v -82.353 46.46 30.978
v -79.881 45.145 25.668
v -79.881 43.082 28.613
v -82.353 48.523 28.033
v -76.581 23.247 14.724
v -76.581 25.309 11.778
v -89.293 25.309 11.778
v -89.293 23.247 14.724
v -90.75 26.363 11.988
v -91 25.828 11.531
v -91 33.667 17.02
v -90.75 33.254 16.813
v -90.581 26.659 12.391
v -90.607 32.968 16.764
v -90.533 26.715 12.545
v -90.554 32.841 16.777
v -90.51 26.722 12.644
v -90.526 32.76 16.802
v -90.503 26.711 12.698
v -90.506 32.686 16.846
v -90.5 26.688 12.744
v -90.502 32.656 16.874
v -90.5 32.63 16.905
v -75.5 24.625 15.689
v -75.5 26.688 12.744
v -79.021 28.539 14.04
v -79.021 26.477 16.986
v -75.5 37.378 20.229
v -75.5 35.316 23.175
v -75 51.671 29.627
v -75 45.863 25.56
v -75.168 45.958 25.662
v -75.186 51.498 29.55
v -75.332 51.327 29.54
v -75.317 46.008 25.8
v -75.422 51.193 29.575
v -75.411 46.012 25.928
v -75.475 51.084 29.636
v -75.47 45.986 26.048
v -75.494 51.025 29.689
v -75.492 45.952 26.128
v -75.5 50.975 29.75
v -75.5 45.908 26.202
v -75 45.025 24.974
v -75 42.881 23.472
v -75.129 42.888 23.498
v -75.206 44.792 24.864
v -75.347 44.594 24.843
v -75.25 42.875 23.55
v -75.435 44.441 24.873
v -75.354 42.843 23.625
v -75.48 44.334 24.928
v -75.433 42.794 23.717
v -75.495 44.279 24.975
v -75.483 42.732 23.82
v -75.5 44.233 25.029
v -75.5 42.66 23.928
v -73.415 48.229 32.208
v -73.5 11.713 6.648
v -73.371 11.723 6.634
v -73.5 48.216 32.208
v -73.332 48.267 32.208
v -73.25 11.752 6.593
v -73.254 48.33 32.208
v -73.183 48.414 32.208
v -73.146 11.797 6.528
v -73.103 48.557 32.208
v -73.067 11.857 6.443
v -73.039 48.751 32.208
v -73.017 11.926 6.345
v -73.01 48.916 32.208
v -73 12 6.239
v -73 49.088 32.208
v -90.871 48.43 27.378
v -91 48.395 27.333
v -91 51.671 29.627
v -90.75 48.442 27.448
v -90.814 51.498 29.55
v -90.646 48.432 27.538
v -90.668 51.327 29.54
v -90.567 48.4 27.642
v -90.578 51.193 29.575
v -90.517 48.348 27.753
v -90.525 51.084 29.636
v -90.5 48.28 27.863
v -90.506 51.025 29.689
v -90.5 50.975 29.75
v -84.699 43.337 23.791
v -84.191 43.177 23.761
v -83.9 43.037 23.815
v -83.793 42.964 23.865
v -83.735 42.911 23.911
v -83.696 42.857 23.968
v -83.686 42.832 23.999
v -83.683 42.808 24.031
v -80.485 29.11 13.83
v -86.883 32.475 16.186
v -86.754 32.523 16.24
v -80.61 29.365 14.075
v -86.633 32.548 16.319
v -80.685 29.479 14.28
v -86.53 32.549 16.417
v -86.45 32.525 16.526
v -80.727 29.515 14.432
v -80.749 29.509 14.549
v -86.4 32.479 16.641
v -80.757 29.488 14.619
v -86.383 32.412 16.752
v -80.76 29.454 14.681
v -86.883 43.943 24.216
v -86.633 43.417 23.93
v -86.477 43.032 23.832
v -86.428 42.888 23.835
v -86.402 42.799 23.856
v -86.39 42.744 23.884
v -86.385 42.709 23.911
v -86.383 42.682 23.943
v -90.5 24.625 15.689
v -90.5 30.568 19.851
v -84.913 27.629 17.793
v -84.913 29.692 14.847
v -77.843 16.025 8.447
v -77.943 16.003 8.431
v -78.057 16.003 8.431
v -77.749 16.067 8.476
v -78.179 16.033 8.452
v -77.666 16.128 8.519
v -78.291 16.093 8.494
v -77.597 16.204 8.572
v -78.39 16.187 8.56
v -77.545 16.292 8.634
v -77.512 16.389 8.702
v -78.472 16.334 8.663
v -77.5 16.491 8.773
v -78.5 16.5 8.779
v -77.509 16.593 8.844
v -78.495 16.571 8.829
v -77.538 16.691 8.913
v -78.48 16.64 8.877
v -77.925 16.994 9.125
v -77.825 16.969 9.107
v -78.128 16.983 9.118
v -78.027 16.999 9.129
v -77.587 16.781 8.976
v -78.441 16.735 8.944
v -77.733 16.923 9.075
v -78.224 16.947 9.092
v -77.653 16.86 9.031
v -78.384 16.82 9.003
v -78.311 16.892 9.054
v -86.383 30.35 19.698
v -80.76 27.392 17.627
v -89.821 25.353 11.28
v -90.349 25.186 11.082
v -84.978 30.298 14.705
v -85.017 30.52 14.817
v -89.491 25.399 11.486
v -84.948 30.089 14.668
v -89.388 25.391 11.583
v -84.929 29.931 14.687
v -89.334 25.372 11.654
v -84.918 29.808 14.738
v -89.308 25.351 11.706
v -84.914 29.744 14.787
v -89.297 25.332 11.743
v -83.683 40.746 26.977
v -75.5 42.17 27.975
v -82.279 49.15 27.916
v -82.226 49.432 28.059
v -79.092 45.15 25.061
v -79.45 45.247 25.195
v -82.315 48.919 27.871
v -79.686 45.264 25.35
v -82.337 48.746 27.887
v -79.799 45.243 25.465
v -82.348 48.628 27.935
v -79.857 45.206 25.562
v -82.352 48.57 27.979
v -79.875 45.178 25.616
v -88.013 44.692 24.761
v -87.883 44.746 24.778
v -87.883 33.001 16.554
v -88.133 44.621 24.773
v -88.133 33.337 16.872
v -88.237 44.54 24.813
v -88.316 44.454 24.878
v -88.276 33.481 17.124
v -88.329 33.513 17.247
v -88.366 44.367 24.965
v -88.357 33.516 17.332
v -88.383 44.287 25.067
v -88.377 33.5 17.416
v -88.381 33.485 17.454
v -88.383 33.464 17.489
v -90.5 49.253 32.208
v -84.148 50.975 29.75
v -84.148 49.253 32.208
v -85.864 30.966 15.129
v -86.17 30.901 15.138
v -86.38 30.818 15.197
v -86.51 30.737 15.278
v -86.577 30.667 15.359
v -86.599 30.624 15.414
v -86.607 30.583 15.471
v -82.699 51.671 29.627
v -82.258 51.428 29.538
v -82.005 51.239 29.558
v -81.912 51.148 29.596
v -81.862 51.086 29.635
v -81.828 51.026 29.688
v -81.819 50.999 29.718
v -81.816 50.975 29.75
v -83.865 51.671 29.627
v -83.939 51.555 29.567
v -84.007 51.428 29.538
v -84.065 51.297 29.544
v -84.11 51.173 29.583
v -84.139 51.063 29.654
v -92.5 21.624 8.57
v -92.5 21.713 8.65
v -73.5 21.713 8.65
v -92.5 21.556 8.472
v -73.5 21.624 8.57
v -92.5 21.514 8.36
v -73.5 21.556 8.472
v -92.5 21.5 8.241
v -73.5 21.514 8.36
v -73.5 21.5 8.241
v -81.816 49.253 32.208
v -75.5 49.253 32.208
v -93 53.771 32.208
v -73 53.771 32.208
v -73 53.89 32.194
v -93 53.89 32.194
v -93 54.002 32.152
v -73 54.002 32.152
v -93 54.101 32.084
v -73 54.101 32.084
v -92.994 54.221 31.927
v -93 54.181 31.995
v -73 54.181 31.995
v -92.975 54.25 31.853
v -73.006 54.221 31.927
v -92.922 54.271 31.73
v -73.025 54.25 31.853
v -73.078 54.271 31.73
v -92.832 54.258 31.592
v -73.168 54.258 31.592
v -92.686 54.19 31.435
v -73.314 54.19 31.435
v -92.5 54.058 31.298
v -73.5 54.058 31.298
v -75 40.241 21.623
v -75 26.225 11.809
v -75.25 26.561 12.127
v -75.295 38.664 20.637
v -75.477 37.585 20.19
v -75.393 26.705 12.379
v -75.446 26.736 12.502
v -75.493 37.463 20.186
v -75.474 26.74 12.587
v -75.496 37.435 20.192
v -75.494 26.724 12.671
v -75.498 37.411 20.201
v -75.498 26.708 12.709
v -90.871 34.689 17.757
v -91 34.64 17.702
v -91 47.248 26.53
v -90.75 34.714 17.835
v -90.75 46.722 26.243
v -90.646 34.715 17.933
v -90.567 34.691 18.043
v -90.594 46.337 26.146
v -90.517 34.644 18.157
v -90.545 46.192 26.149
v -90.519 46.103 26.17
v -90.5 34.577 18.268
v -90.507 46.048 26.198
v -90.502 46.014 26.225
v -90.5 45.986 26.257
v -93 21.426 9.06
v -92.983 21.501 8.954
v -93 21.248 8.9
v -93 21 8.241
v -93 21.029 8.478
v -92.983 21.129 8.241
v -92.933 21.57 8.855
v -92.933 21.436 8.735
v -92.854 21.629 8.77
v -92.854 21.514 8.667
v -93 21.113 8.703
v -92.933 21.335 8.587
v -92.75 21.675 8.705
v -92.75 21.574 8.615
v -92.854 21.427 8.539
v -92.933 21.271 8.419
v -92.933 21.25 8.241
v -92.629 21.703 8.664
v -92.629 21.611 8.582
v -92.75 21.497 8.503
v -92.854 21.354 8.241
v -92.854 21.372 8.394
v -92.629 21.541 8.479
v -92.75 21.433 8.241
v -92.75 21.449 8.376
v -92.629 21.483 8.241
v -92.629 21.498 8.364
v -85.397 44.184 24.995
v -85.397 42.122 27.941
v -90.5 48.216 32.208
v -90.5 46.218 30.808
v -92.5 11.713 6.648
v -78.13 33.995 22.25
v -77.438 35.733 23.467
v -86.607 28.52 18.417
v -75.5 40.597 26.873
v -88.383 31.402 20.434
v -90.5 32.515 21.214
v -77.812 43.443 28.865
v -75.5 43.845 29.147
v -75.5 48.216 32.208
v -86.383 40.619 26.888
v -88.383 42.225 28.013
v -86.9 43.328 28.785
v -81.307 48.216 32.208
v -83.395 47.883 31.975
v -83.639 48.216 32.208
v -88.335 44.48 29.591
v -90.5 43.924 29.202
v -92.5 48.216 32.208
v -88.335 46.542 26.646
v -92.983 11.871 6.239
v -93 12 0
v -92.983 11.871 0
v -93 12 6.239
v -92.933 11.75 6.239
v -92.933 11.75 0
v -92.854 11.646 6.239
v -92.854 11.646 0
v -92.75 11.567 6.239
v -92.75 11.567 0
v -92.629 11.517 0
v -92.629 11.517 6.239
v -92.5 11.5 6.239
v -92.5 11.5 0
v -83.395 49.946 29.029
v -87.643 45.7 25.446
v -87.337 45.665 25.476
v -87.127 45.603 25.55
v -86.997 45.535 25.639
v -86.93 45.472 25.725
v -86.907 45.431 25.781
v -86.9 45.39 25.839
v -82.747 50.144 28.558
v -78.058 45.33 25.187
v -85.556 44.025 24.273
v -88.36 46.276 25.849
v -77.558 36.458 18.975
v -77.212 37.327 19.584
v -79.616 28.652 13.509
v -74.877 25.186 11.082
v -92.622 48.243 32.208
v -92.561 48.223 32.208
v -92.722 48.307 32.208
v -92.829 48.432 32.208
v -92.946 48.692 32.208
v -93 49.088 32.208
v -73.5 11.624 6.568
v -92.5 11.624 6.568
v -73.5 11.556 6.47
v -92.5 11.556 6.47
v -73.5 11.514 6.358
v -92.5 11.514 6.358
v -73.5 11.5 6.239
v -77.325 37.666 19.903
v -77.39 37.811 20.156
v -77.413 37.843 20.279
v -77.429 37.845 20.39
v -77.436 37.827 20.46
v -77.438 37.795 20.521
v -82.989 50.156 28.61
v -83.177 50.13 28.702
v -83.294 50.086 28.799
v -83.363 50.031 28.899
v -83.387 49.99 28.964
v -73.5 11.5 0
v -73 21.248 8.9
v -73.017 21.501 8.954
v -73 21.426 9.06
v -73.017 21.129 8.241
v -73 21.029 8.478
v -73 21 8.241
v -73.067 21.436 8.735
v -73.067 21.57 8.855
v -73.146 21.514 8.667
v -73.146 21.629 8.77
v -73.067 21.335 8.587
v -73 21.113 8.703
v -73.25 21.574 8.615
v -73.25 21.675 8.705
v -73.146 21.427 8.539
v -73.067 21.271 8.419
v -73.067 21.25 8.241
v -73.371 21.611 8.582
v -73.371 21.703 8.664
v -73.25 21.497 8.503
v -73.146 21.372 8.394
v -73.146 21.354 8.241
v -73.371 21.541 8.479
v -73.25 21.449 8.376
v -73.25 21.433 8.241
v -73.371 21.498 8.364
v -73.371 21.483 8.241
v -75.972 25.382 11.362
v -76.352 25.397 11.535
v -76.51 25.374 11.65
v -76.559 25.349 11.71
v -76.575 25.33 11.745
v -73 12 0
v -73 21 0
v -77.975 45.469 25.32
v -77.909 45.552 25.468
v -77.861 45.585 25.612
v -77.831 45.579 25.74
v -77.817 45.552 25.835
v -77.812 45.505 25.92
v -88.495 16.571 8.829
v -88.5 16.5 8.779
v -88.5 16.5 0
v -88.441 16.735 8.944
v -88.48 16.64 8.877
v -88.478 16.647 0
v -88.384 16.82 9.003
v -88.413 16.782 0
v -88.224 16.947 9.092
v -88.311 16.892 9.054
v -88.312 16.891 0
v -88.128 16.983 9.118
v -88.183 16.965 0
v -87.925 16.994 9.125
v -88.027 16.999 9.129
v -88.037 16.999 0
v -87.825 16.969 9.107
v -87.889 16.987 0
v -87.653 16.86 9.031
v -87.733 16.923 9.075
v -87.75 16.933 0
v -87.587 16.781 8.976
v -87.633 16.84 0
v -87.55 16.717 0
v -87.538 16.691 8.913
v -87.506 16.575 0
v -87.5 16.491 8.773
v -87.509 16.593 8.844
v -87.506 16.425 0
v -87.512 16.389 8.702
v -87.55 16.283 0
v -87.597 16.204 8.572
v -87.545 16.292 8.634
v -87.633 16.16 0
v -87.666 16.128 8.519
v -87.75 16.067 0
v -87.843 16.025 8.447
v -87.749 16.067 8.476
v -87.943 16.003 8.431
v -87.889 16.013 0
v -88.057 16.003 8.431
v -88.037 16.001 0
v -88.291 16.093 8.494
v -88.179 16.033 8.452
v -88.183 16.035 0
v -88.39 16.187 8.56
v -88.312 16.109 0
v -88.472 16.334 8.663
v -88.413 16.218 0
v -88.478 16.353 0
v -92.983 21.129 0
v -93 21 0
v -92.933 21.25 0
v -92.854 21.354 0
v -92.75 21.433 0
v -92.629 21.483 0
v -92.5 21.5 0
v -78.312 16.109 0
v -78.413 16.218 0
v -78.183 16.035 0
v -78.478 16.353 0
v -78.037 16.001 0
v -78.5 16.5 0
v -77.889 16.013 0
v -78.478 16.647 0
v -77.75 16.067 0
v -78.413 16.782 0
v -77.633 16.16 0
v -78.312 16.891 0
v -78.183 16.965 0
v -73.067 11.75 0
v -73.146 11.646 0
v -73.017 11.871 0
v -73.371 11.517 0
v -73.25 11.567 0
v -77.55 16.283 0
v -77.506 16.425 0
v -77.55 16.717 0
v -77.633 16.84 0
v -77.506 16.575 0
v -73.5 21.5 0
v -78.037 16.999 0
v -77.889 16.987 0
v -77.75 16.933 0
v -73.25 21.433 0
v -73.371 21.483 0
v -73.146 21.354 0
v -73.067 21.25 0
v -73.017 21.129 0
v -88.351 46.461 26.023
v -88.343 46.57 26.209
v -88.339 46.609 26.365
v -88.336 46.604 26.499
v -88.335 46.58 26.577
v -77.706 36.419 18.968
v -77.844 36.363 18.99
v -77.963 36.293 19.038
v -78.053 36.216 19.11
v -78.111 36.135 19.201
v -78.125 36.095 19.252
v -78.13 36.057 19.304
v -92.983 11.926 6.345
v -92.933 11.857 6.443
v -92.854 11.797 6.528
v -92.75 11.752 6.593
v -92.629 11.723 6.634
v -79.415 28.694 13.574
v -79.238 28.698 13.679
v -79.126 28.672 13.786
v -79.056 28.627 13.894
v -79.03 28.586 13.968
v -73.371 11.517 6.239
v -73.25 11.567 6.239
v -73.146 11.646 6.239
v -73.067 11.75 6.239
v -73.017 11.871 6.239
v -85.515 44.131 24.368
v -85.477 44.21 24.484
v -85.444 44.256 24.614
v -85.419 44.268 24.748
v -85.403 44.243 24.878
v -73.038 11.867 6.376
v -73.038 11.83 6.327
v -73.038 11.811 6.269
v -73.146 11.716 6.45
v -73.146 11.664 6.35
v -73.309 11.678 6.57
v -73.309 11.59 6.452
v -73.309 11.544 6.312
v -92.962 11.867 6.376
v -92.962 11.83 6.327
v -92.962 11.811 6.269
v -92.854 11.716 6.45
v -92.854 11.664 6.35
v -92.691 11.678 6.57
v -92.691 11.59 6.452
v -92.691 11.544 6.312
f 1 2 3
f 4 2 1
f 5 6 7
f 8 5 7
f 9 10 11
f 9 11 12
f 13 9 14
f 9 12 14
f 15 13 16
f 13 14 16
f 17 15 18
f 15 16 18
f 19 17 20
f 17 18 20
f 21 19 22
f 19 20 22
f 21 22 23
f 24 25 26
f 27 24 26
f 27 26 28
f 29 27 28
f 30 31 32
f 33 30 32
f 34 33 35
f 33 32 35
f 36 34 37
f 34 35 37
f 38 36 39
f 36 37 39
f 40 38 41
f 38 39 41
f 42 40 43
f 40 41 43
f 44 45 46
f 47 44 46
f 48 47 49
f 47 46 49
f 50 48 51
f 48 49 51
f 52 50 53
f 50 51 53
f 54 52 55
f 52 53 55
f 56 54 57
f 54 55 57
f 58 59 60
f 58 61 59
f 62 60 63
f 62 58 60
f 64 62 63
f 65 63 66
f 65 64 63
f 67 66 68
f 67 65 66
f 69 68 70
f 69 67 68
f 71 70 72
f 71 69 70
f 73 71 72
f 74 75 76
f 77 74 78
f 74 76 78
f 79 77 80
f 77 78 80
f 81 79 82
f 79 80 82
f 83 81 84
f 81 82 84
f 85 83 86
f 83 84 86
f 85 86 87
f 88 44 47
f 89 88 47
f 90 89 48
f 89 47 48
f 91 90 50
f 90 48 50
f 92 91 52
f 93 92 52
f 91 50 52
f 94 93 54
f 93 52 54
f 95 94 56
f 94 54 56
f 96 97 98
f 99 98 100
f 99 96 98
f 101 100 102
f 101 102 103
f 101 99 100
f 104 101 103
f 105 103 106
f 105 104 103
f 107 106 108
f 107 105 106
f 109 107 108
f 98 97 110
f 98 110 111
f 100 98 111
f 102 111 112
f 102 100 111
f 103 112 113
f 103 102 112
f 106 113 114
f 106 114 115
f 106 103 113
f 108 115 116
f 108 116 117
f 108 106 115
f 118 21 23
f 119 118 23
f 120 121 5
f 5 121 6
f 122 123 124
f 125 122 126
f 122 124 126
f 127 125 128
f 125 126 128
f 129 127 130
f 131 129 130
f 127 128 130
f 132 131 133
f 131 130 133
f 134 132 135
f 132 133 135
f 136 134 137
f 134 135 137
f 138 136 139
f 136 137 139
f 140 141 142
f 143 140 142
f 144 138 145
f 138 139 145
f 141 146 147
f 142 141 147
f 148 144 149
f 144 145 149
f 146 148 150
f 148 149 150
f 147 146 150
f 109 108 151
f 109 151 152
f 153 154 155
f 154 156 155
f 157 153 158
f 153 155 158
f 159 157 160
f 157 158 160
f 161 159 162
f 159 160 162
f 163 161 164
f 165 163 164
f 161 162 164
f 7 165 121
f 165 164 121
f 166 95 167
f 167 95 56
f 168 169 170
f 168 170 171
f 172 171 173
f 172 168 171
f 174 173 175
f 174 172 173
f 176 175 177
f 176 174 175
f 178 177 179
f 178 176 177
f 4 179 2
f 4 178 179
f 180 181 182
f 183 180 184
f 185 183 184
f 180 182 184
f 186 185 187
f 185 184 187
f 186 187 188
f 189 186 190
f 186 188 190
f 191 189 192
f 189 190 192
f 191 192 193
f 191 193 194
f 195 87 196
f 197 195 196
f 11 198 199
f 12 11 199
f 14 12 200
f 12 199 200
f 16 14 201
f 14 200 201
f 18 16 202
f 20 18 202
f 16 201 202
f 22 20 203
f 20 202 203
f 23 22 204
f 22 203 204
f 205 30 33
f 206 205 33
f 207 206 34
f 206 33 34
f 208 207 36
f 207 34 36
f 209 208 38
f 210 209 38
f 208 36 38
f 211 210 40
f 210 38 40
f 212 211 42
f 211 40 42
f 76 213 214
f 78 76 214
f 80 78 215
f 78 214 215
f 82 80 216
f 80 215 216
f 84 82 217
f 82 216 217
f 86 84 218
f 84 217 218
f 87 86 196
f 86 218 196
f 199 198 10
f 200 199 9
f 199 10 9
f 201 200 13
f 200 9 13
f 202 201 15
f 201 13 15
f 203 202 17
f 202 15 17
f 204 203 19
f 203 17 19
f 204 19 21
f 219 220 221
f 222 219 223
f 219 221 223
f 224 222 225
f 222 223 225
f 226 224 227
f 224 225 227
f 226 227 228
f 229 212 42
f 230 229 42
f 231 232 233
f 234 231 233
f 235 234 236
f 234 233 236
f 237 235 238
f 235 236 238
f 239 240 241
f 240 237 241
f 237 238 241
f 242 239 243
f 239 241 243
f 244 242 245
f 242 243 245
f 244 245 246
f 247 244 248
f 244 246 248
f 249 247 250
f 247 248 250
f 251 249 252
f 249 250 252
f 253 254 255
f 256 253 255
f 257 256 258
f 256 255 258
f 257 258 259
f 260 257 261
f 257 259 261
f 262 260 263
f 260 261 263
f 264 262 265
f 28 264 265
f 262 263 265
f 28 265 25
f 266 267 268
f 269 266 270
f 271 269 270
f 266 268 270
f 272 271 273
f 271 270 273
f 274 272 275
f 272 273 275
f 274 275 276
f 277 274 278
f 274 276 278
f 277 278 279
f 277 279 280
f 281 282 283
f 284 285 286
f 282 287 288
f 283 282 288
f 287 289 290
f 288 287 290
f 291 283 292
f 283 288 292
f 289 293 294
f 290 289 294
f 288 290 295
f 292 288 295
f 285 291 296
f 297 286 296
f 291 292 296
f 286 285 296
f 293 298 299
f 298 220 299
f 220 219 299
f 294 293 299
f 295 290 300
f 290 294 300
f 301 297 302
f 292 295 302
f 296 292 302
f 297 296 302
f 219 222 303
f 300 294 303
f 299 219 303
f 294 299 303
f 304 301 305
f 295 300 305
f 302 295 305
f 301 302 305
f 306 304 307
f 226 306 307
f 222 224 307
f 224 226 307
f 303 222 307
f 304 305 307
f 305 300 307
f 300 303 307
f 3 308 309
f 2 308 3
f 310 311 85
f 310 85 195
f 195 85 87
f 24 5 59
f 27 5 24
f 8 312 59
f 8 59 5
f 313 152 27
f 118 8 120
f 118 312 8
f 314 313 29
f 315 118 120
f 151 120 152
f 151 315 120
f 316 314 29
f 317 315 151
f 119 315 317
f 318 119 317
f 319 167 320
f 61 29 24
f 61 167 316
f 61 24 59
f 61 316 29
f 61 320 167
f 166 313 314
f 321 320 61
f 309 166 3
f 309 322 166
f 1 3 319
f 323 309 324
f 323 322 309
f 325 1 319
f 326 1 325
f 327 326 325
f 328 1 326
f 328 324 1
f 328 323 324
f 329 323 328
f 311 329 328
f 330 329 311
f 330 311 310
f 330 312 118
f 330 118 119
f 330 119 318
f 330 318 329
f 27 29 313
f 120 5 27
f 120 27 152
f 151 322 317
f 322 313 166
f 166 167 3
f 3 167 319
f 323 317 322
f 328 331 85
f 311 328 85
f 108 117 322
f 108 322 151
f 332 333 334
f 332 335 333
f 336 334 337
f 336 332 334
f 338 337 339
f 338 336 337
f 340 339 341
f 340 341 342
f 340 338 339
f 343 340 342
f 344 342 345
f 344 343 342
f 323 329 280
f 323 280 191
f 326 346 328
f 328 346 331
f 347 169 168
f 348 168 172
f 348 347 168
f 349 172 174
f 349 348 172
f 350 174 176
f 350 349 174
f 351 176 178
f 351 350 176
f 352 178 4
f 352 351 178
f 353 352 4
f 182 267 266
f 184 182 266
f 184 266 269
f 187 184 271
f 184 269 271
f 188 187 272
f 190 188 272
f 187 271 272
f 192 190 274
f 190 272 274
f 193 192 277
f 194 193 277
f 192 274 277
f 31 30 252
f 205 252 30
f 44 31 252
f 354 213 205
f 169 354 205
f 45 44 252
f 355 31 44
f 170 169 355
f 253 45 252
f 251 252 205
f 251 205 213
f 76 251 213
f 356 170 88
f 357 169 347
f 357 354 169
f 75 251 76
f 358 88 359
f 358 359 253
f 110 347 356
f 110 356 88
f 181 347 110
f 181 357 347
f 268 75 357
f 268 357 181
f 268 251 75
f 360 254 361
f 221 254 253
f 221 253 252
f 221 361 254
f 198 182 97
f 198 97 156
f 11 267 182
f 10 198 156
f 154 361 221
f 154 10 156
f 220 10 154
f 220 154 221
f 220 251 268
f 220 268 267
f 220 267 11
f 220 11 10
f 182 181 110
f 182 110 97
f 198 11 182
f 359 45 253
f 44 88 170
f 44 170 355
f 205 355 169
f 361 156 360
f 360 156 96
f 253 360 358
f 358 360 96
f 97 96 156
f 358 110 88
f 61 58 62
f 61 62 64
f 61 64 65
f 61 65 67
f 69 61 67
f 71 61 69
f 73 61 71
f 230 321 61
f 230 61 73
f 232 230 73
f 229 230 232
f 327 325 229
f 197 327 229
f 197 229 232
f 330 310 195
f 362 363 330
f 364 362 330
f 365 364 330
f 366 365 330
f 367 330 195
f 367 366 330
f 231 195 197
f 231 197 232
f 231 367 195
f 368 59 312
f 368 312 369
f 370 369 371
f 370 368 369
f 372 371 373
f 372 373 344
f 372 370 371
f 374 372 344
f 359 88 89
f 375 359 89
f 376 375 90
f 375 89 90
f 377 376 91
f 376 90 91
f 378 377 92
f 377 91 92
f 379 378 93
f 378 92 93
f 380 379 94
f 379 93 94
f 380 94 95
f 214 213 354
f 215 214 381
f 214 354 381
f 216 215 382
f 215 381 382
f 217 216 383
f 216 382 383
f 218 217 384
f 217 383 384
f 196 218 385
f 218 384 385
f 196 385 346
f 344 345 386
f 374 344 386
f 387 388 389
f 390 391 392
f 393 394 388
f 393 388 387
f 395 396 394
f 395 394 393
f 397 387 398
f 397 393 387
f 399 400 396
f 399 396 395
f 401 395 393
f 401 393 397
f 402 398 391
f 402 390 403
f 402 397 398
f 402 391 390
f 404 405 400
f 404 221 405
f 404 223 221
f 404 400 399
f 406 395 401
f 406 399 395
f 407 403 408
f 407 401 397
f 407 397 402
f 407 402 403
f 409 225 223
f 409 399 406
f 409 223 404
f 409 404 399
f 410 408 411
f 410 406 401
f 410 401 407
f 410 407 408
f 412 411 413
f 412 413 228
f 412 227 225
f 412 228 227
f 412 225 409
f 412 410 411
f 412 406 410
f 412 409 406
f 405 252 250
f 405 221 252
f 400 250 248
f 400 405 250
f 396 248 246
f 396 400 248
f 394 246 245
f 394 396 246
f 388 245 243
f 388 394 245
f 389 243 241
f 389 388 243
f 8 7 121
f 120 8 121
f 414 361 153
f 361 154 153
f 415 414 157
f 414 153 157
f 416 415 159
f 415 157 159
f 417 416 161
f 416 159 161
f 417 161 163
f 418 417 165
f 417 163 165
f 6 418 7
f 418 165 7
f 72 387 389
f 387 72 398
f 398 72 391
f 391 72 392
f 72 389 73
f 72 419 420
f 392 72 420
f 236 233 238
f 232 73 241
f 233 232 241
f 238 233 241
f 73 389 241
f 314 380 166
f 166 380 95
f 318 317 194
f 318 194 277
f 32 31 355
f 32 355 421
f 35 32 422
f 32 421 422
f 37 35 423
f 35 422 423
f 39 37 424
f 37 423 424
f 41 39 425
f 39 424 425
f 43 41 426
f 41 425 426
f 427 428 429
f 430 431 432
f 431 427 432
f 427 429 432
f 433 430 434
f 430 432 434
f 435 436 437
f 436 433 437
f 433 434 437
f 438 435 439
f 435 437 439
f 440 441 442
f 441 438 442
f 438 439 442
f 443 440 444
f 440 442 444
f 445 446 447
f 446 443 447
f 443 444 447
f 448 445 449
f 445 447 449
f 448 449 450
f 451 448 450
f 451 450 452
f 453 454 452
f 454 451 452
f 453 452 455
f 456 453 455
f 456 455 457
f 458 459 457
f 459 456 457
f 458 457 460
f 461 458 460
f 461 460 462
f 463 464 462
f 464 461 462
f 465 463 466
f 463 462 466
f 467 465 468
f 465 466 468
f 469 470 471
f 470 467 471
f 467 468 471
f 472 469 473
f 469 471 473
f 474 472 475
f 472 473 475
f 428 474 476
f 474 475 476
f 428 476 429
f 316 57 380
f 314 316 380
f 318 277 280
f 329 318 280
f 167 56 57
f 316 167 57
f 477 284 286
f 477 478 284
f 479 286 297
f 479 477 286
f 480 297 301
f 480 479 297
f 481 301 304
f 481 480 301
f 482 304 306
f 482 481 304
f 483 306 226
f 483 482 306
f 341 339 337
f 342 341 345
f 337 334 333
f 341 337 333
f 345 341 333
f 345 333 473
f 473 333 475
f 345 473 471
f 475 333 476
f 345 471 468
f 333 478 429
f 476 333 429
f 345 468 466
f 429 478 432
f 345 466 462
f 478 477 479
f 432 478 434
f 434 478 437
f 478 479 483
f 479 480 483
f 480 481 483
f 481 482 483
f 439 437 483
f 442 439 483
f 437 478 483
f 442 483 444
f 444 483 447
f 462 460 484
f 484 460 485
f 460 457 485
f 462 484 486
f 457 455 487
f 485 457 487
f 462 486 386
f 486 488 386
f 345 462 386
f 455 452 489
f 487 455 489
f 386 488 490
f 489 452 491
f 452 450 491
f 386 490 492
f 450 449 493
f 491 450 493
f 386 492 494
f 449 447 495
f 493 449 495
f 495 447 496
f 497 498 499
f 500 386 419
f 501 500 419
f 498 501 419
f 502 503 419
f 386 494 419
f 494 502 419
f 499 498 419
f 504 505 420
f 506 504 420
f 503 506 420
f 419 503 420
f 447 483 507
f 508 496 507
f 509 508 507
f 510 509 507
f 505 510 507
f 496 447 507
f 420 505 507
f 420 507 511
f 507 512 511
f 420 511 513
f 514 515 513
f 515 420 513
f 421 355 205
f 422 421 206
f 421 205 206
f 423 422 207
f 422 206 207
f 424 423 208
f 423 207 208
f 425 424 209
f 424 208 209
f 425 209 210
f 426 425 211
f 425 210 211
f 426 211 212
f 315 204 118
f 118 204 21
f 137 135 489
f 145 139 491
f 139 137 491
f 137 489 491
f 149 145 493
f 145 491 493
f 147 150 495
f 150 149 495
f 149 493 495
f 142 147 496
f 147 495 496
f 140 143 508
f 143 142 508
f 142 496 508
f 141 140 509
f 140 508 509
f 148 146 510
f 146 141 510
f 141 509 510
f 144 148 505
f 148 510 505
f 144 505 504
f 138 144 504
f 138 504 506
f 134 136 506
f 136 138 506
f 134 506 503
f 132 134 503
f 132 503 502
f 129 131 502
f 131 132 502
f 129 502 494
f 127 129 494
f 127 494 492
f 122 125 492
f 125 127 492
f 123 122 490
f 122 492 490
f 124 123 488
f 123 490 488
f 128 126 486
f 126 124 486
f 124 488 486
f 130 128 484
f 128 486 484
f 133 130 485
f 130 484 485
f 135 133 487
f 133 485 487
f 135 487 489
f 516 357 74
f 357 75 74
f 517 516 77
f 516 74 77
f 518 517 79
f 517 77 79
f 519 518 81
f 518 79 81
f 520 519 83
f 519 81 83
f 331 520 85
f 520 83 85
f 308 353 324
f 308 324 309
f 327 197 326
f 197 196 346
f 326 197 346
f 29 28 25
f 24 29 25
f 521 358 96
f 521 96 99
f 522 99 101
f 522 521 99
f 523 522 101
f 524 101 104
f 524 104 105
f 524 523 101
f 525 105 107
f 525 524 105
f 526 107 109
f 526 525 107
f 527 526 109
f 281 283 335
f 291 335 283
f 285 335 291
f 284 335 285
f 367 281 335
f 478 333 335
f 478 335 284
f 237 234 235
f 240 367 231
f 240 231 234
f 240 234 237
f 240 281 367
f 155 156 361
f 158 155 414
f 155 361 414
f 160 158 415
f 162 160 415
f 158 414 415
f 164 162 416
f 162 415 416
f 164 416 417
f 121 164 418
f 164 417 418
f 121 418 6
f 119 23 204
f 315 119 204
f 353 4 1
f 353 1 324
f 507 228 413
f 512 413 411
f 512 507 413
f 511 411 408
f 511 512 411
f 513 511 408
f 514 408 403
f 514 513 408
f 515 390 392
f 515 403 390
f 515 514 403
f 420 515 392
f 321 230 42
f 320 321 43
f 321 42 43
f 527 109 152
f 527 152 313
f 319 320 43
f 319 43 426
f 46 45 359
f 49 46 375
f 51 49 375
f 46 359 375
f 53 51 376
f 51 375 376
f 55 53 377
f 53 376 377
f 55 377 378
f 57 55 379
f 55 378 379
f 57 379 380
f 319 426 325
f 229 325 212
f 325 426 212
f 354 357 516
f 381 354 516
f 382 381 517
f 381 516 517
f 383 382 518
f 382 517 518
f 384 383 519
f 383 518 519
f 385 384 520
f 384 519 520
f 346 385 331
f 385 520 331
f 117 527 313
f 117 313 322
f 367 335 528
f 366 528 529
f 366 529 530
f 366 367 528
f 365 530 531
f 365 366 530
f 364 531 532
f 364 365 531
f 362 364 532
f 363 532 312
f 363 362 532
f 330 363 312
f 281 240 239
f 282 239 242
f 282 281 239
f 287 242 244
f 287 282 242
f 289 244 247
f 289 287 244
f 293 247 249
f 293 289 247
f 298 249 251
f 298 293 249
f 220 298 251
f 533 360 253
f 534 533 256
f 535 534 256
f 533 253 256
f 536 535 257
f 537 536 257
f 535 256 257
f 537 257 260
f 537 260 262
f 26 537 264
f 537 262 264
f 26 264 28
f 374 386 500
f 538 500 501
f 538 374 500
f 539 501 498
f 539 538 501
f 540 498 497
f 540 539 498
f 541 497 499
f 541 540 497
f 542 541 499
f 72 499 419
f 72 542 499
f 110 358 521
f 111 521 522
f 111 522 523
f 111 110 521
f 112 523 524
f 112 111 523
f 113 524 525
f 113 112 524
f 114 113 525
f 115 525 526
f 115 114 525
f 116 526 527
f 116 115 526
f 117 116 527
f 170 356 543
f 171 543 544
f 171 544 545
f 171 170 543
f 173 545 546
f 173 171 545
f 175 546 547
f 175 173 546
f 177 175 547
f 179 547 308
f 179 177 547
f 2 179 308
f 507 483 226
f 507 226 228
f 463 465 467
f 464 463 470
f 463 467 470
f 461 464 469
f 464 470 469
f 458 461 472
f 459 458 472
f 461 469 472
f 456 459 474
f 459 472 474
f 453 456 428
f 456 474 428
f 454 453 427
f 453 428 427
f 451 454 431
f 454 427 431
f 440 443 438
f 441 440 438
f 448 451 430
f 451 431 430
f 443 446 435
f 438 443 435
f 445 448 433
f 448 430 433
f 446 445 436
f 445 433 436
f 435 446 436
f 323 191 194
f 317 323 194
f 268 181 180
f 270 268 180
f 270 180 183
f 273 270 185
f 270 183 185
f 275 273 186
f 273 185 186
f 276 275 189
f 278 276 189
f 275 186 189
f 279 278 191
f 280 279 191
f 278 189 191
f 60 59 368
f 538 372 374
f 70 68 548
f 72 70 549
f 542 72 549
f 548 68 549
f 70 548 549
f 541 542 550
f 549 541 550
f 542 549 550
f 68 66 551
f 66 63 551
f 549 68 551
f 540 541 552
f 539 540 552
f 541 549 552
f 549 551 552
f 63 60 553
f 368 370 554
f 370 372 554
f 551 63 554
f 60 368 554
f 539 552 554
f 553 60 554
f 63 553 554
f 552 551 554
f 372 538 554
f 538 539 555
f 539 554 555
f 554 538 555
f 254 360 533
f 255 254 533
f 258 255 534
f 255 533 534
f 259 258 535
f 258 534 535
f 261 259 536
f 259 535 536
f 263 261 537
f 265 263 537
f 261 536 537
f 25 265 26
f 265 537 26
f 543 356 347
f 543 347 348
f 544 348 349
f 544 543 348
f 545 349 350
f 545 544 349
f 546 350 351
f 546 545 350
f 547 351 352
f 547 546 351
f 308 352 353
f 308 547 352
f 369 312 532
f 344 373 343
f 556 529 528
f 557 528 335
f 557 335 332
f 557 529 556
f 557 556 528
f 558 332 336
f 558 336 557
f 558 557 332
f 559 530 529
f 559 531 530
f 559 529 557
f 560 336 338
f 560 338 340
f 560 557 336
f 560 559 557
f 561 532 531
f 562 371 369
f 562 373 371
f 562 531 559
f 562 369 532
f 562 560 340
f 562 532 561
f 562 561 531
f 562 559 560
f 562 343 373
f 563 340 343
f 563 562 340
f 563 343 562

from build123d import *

# Parameters (mm, degrees)
SKETCH1_W                        = 20
SKETCH1_H                        = 10
BOSS_EXTRUDE1_DEPTH              = 5
BOSS_EXTRUDE2_DEPTH              = 20
CUT_EXTRUDE1_DEPTH               = 4.09576
FILLET1_R                        = 0.5
CUT_EXTRUDE2_REACH               = 35.208
CUT_EXTRUDE2_OFFSET_FROM_SURFACE = 1
SKETCH4_R                        = 0.5


with BuildPart() as part:
    # Sketch1 → Boss-Extrude1 (new body)
    with BuildSketch(Plane.XY):
        with Locations((-83, 16.5)):
            Rectangle(SKETCH1_W, SKETCH1_H)
    extrude(amount=BOSS_EXTRUDE1_DEPTH)

    # Sketch2 → Boss-Extrude2 (add)
    with BuildSketch(Plane.ZY.offset(93)):
        Polygon((5, 16.5), (1.498962309, 11.5), (6.498962309, 11.5), (32.208054955, 48.216389418), (32.208054955, 55.357129452), (8.501037691, 21.5), (5, 21.5), align=None)
    extrude(amount=-BOSS_EXTRUDE2_DEPTH)

    # Sketch3 → Cut-Extrude1 (cut)
    with BuildSketch(Plane(origin=(0, 3.079102266, -4.397413763), x_dir=(-1, 0, 0), z_dir=(0, 0.573576436, -0.819152044))):
        Polygon((90.5, 29.170685305), (90.5, 36.425657649), (86.606804382, 33.925761075), align=None)
        Polygon((76.580636571, 27.487763856), (89.293048323, 27.487763856), (84.912643674, 32.837907557), align=None)
        Polygon((79.020661139, 31.431370249), (75.5, 42.221469006), (75.5, 29.170685305), align=None)
        Polygon((83.682826439, 48.850072065), (75.5, 50.589500561), (75.5, 48.669091242), (77.437703633, 42.730430083), align=None)
        Polygon((77.812370658, 52.142645531), (81.816362113, 58.81968714), (75.5, 58.81968714), (75.5, 52.634187597), align=None)
        Polygon((90.5, 55.53027081), (90.5, 58.81968714), (84.148398738, 58.81968714), (83.395113947, 57.563512158), (88.334689519, 53.40846707), align=None)
        Polygon((86.899562452, 52.002175453), (85.397480311, 50.530274064), (79.880748536, 51.702969161), (82.353375162, 55.826312344), align=None)
        Polygon((90.5, 38.802476843), (90.5, 52.730114749), (88.38308654, 50.655735608), (88.38308654, 37.443165566), align=None)
        Polygon((86.38308654, 36.158926695), (80.76001209, 32.548241301), (78.130006045, 40.608666271), (86.38308654, 48.69592083), align=None)
    extrude(amount=-CUT_EXTRUDE1_DEPTH, mode=Mode.SUBTRACT)

    # Fillet1
    fillet1_edges = [part.edges().sort_by_distance(p)[0] for p in [
        (-88.38308654, 39.162299764, 20.868313128),
        (-90.5, 40.568657026, 21.853055085),
        (-89.44154327, 34.307489189, 17.468938167),
        (-89.44154327, 45.423467601, 25.252430045),
        (-85.864901733, 48.530564087, 27.428042427),
        (-90.5, 49.914103175, 28.396806926),
        (-87.324199369, 51.26136923, 29.340172774),
        (-89.41734476, 47.697797184, 26.844932764),
        (-83.771756342, 50.746870078, 28.979916589),
        (-84.626468807, 47.243065371, 26.526526121),
        (-81.117061849, 47.120517648, 26.440717281),
        (-82.639114423, 44.951387357, 24.9218759),
        (-86.148521381, 45.07393508, 25.007684739),
        (-88.553402191, 31.893356499, 15.778544259),
        (-88.553402191, 28.921893785, 13.697903667),
        (-90.5, 29.94579148, 14.414844551),
        (-83, 21.5, 8.501037691),
        (-83, 55.357129452, 32.208054955),
        (-83, 11.5, 6.498962309),
        (-93, 29.858194709, 19.353508632),
        (-93, 38.428564726, 20.354546323),
        (-73, 38.428564726, 20.354546323),
        (-73, 29.858194709, 19.353508632),
        (-80.560265036, 40.588280041, 21.866795268),
        (-76.468851816, 40.514154635, 21.814892099),
        (-79.59141322, 43.807166866, 24.120684086),
        (-75.5, 43.73304146, 24.068780918),
        (-73, 11.5, 3.249481154),
        (-76.656185329, 45.993180791, 25.651347516),
        (-93, 11.5, 3.249481154),
        (-79.814366386, 48.526613089, 27.425275908),
        (-78.658181056, 51.26136923, 29.340172774),
        (-75.5, 48.727936933, 27.566244381),
        (-93, 21.5, 4.250518846),
        (-73, 21.5, 4.250518846),
        (-87.102845999, 27.787050796, 12.903278052),
        (-80.746640123, 27.787050796, 12.903278052),
        (-82.936842447, 25.595760221, 11.368919873),
        (-77.26033057, 27.900251113, 12.982541767),
        (-77.26033057, 33.245539188, 16.725352771),
        (-75.5, 32.319616841, 16.077014963),
        (-86.38308654, 37.833613175, 19.937956762),
        (-82.256546293, 39.65611981, 21.214089647),
        (-79.445009068, 33.042417461, 16.583125407),
        (-83.571549315, 31.219910826, 15.306992522),
    ]]
    fillet(fillet1_edges, radius=FILLET1_R)

    # Cut-Extrude2: up to this face of the body (flat: up to its plane, moved by the offset)
    cut_extrude2_end = Plane(part.part.faces().sort_by_distance((-83.030327421, 27.270141069, 17.541333964))[0]).offset(-CUT_EXTRUDE2_OFFSET_FROM_SURFACE)
    # Sketch4 → Cut-Extrude2 (cut, up to the picked face)
    with BuildSketch(Plane(origin=(0, 0, 0), x_dir=(-1, 0, 0), z_dir=(0, 0, -1)), mode=Mode.PRIVATE) as cut_extrude2_sk1:
        with Locations((78, 16.5)):
            Circle(SKETCH4_R)
    cut_extrude2_tool1 = split(extrude(cut_extrude2_sk1.sketch, amount=-CUT_EXTRUDE2_REACH, mode=Mode.PRIVATE), bisect_by=cut_extrude2_end, keep=Keep.BOTH, mode=Mode.PRIVATE)
    add(cut_extrude2_tool1.solids().sort_by_distance((-78, 16.5, 0))[0], mode=Mode.SUBTRACT)
    # Sketch4 → Cut-Extrude2 (cut, up to the picked face)
    with BuildSketch(Plane(origin=(0, 0, 0), x_dir=(-1, 0, 0), z_dir=(0, 0, -1)), mode=Mode.PRIVATE) as cut_extrude2_sk2:
        with Locations((88, 16.5)):
            Circle(SKETCH4_R)
    cut_extrude2_tool2 = split(extrude(cut_extrude2_sk2.sketch, amount=-CUT_EXTRUDE2_REACH, mode=Mode.PRIVATE), bisect_by=cut_extrude2_end, keep=Keep.BOTH, mode=Mode.PRIVATE)
    add(cut_extrude2_tool2.solids().sort_by_distance((-88, 16.5, 0))[0], mode=Mode.SUBTRACT)


solid = part.part
